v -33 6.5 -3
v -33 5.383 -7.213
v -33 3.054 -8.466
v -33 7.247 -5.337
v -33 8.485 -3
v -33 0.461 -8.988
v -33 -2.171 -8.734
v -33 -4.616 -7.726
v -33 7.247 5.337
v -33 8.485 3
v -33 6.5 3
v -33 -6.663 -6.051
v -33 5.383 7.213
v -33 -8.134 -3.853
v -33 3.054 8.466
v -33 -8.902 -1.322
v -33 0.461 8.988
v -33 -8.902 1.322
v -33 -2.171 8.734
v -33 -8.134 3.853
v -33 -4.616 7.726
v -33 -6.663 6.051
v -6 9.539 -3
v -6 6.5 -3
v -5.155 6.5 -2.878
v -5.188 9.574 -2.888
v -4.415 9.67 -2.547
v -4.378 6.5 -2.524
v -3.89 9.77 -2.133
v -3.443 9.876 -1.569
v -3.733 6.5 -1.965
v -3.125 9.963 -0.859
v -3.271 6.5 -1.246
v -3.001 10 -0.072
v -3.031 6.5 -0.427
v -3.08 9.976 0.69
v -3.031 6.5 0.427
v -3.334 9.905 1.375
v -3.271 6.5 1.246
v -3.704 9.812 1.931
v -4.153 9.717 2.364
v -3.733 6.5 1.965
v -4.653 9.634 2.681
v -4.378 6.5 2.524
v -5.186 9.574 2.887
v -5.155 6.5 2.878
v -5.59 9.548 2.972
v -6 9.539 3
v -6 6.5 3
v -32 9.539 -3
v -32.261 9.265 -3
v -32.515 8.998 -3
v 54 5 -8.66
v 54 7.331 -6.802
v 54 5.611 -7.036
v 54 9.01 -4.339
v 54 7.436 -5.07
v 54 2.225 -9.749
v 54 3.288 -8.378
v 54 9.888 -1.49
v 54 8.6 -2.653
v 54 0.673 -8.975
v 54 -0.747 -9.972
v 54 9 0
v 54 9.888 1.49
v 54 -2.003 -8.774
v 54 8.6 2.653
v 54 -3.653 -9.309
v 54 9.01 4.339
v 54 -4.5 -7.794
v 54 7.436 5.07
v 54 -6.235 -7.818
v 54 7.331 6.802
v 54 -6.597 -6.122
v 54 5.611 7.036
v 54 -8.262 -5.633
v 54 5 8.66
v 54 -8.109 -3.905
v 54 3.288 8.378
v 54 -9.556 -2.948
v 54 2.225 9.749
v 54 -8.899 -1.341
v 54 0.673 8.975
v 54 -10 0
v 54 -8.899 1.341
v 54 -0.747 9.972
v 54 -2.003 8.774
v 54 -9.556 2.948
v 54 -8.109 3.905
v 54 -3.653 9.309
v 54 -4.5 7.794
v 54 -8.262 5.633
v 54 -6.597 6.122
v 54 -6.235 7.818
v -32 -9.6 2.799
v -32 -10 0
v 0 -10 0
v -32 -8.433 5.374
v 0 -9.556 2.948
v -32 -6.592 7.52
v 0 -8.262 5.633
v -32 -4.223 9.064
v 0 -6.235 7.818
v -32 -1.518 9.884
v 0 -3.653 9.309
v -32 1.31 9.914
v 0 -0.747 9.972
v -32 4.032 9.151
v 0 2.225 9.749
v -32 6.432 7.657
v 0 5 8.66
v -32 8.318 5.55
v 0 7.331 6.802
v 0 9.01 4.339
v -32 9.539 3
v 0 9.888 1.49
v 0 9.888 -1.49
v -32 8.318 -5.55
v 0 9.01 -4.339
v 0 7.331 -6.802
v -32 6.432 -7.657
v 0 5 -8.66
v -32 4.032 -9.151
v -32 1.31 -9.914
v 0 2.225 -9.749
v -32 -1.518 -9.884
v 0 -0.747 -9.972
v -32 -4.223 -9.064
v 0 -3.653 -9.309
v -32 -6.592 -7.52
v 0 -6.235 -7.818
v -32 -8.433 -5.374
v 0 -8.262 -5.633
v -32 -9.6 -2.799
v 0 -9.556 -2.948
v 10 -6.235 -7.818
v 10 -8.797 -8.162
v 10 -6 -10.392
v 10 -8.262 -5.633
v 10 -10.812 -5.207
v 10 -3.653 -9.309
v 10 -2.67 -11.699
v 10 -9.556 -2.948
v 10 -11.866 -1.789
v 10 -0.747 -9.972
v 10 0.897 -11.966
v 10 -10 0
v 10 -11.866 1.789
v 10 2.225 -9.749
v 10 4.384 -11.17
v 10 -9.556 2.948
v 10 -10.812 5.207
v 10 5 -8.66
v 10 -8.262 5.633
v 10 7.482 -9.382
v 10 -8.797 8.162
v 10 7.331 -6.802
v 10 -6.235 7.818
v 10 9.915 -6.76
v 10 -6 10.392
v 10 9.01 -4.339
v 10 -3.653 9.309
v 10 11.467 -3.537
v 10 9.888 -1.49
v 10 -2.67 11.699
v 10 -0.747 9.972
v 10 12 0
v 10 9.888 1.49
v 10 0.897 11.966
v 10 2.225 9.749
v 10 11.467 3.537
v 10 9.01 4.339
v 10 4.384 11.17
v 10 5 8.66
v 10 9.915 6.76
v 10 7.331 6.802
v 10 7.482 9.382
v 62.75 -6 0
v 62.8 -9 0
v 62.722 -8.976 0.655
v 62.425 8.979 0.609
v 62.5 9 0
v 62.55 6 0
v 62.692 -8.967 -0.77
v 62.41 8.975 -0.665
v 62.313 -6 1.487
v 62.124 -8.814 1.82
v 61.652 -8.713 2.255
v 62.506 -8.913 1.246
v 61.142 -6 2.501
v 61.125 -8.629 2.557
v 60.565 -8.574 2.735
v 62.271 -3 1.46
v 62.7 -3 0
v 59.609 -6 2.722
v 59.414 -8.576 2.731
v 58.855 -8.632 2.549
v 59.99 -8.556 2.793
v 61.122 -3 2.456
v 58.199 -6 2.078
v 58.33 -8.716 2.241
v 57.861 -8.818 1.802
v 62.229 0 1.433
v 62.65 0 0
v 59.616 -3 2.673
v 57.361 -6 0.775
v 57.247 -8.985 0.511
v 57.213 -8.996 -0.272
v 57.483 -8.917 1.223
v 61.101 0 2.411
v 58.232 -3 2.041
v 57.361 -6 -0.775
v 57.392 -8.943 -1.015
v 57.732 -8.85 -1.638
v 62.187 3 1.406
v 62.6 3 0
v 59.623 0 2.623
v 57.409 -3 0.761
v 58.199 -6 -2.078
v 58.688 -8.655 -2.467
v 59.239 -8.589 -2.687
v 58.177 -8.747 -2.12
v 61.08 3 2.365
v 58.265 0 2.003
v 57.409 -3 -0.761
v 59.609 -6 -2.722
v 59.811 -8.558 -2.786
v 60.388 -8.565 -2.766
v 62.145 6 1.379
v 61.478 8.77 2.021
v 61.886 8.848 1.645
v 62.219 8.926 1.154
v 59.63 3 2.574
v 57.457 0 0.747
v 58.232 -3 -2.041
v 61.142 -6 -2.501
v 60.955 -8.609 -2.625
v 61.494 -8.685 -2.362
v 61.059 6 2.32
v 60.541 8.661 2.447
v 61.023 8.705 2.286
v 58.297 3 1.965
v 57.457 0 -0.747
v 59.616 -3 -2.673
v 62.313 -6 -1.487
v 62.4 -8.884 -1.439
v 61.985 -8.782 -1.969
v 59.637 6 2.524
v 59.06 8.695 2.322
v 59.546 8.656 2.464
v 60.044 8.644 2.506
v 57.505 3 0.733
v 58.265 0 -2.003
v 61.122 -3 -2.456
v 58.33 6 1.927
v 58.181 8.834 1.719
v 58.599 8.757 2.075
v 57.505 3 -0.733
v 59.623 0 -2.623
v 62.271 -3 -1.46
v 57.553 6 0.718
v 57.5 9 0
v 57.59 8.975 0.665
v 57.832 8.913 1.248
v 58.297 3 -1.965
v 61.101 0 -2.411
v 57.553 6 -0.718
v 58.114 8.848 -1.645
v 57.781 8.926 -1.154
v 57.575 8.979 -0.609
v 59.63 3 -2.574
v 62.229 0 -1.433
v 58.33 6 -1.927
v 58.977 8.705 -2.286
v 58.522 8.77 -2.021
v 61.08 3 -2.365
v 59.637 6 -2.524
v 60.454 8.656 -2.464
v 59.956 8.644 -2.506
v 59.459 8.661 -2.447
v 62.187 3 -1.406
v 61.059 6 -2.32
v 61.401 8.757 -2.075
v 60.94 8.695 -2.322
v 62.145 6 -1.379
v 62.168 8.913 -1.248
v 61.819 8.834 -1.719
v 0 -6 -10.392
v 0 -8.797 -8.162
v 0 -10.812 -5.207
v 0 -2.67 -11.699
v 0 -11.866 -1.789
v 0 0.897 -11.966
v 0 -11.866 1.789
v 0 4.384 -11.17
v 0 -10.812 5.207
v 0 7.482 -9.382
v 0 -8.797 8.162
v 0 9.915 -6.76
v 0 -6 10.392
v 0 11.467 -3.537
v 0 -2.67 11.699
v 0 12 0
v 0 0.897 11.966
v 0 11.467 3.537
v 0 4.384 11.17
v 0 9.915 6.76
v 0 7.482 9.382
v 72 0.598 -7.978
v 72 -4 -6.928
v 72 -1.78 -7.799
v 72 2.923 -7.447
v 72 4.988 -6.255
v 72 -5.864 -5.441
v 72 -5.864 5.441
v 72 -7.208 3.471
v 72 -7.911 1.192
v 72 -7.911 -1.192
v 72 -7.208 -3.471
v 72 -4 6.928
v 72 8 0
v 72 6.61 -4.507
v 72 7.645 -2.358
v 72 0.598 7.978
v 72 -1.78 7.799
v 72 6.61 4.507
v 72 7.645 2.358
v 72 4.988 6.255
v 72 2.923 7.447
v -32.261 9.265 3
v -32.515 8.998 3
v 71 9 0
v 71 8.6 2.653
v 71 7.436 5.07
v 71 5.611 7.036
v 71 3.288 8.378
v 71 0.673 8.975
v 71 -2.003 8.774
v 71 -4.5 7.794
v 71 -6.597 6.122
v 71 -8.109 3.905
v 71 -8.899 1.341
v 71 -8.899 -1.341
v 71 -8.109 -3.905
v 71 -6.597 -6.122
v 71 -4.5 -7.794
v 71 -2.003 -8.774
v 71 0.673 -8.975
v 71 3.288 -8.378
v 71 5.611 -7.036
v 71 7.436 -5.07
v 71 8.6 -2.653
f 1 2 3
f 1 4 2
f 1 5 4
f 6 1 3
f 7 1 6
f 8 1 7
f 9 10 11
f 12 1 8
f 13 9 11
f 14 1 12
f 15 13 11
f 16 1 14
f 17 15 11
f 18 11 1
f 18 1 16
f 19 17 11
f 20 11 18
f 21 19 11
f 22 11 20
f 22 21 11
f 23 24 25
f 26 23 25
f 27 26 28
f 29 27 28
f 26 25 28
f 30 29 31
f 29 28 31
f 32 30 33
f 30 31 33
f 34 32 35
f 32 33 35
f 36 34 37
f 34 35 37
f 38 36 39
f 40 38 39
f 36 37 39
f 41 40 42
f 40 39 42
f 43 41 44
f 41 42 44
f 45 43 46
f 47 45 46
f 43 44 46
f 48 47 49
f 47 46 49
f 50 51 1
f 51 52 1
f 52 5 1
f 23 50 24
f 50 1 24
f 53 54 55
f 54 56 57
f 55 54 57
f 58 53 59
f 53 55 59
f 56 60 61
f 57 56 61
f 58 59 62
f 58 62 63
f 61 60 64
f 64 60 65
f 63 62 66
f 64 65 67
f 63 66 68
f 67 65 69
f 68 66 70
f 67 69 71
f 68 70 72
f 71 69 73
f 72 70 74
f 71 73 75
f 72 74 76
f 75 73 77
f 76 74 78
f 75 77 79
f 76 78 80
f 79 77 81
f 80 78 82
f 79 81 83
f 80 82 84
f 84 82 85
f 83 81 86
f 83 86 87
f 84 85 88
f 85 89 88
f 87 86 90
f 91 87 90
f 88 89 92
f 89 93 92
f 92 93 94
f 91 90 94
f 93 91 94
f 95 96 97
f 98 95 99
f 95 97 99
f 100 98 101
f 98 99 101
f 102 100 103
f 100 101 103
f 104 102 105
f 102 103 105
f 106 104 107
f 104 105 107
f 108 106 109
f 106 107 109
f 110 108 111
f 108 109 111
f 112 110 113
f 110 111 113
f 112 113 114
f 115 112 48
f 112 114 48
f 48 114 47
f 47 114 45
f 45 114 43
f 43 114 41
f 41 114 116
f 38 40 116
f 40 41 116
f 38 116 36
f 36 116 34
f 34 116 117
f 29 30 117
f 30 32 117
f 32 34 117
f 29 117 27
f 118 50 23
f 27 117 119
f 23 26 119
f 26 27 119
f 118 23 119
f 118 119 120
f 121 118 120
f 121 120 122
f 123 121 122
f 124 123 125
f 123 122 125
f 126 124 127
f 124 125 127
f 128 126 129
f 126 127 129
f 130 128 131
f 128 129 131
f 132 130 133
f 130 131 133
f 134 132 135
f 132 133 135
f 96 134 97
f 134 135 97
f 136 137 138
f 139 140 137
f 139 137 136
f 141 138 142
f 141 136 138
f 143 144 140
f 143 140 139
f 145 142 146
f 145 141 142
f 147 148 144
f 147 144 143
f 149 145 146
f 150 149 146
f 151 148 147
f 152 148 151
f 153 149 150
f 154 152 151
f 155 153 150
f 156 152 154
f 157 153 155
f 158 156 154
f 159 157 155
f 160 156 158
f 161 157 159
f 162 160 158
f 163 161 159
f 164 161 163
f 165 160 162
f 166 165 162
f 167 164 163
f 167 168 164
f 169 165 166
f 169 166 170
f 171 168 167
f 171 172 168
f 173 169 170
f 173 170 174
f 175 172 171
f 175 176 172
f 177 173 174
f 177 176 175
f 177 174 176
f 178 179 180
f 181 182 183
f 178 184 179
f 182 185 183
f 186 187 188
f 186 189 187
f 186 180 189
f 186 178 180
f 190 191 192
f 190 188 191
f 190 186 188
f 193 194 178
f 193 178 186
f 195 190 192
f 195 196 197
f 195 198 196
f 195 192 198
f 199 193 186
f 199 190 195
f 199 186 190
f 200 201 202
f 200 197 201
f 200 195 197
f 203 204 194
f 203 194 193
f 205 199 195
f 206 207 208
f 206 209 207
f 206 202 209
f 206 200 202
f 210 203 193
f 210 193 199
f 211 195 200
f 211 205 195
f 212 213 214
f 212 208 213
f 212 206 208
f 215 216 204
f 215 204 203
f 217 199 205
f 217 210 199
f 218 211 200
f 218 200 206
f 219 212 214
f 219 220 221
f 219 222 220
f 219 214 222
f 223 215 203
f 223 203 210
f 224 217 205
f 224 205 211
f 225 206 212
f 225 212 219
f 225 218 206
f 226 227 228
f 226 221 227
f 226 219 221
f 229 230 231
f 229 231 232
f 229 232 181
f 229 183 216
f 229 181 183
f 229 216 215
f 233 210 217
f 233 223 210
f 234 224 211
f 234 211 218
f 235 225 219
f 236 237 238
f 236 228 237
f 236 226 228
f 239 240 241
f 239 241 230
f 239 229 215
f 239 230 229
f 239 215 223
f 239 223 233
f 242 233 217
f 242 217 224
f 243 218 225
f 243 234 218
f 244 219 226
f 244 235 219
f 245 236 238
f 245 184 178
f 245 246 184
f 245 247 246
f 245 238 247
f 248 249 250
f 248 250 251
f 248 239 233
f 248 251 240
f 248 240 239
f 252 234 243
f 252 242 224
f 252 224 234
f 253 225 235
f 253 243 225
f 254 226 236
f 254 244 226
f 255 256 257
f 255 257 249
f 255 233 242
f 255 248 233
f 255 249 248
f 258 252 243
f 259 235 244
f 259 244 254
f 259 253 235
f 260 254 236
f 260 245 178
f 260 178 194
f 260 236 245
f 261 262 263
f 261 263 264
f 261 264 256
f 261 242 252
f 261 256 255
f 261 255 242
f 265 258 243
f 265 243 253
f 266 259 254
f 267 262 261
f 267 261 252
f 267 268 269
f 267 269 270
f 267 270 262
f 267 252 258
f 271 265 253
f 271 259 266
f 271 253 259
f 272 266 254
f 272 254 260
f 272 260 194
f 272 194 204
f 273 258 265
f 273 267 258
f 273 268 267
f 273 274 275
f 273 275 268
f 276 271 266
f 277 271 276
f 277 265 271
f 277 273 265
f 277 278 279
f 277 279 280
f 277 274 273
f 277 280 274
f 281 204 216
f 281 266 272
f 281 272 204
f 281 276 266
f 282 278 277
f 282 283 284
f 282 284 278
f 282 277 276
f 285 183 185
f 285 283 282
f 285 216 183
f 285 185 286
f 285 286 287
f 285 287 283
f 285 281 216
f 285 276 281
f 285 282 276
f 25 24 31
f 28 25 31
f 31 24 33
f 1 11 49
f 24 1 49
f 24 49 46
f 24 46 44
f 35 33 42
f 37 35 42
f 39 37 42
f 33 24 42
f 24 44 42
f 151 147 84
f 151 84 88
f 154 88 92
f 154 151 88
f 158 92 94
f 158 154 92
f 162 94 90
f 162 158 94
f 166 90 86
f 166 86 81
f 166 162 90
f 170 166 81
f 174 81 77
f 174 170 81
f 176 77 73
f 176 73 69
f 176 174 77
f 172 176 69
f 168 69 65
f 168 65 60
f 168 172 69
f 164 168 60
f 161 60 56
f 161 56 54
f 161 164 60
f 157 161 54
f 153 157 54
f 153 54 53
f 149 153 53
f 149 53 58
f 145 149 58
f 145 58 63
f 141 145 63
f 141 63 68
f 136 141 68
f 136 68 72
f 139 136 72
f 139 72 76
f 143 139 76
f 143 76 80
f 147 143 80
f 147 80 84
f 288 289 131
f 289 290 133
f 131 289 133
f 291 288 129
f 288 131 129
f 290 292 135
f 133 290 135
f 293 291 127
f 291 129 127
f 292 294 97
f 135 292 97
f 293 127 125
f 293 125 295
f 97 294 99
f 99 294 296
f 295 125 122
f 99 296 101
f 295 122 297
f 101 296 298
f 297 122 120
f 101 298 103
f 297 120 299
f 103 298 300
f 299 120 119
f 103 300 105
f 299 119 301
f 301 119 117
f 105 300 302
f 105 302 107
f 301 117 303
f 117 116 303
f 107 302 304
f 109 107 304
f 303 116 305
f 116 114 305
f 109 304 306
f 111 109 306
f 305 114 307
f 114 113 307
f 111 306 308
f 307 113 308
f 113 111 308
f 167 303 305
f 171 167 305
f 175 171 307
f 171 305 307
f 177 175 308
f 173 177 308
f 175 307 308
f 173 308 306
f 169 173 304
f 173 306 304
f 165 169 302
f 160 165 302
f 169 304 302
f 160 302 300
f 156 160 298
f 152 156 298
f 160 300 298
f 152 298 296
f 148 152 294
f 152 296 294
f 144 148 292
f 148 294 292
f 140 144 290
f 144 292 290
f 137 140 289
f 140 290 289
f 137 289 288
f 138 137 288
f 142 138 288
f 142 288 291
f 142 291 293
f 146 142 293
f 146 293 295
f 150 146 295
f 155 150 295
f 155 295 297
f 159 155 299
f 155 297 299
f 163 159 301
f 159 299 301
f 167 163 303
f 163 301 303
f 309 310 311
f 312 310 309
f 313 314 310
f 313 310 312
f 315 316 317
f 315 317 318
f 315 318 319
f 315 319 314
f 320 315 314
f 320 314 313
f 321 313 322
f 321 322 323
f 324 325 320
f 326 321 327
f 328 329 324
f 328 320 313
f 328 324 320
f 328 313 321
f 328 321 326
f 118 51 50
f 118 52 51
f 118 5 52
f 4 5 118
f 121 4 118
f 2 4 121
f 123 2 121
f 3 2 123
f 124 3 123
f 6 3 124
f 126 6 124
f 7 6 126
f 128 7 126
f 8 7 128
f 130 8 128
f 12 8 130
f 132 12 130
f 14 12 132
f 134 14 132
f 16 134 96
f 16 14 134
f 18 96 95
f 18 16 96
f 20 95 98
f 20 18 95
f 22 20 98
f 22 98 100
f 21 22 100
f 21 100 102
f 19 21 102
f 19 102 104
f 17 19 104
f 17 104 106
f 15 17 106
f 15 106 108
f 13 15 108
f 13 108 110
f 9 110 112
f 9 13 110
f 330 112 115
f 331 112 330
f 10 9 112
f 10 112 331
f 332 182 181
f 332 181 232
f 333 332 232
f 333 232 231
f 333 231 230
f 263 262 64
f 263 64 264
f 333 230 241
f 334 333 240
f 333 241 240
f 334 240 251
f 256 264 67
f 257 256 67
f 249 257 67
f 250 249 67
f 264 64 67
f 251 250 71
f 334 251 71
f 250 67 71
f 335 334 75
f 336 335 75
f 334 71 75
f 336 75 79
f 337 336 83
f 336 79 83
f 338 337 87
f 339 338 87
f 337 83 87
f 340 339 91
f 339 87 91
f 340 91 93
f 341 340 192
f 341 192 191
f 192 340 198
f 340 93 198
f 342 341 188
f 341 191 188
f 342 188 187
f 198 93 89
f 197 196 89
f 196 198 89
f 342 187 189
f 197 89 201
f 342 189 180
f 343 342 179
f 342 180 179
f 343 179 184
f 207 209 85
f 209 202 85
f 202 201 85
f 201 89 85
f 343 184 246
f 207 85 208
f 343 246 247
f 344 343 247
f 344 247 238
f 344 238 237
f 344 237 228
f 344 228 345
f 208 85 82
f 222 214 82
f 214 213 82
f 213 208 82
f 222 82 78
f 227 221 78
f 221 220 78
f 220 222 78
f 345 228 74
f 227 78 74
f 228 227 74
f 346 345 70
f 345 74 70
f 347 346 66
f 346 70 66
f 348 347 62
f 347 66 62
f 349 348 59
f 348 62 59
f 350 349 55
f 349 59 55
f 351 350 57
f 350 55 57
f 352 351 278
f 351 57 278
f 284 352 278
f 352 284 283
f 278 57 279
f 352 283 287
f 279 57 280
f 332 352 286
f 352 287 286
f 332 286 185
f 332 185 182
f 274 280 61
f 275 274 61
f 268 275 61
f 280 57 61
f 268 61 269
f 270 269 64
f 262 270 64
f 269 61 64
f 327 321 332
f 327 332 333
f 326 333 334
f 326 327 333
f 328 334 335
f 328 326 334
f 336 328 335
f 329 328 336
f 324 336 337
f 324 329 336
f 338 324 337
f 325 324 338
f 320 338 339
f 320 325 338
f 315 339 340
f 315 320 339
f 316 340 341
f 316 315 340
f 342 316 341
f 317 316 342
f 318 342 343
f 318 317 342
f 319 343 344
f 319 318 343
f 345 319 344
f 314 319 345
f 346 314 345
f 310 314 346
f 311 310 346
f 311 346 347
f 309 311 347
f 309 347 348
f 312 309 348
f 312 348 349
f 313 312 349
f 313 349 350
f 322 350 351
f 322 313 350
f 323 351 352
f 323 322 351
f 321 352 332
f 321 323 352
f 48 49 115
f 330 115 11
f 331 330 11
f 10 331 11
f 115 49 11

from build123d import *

# Parameters (mm, degrees)
F0_R     = 12
F1_DEPTH = 10
F2_R     = 10
F3_DEPTH = 33
F4_DEPTH = 54
F5_R     = 9
F6_DEPTH = 18
F9_DEPTH = 5.501
F10_SIZE = 1
F11_W    = 2.5
F11_H    = 0.980663


with BuildPart() as f1:
    # F0 (on Right) → F1 (new body)
    with BuildSketch(Plane.YZ):
        Circle(F0_R)
    extrude(amount=F1_DEPTH)

    # F2 (on face) → F3 (join)
    with BuildSketch(Plane(origin=(0, 0, 0), x_dir=(0, -1, 0), z_dir=(-1, 0, 0))):
        Circle(F2_R)
    extrude(amount=F3_DEPTH)

    # F2 (on face) → F4 (join)
    with BuildSketch(Plane(origin=(0, 0, 0), x_dir=(0, -1, 0), z_dir=(-1, 0, 0))):
        Circle(F2_R)
    extrude(amount=-F4_DEPTH)

    # F5 (on face) → F6 (join)
    with BuildSketch(Plane.YZ.offset(54)):
        Circle(F5_R)
    extrude(amount=F6_DEPTH)

    # F8 (on offset) → F9 (cut, through all)
    with BuildSketch(Plane.XZ.offset(-6.5)):
        with BuildLine():
            Line((-33, 3), (-33, -3))
            Line((-33, -3), (-6, -3))
            ThreePointArc((-6, -3), (-3, 0), (-6, 3))
            Line((-6, 3), (-33, 3))
        make_face()
    extrude(amount=-F9_DEPTH, mode=Mode.SUBTRACT)

    # F10
    f10_edges = [f1.edges().sort_by_distance(p)[0] for p in [
        (-33, -1.517577, -9.884177),
        (-33, -1.517577, 9.884177),
        (72, -9, 0),
    ]]
    chamfer(f10_edges, length=F10_SIZE)

    # F11 (on Top) → F12 (revolve, cut)
    with BuildSketch(Plane.XY):
        with Locations((61.25, 9.490331)):
            Rectangle(F11_W, F11_H)
        Polygon((62.5, 9), (60, 9), (60, -9), (62.8, -9), align=None)
        Polygon((62.8, -9), (60, -9), (60, -10.015493), (62.816925, -10.015493), align=None)
    revolve(axis=Axis((60, -0.455183, 0), (0, -1, 0)), mode=Mode.SUBTRACT)


solid = f1.part
